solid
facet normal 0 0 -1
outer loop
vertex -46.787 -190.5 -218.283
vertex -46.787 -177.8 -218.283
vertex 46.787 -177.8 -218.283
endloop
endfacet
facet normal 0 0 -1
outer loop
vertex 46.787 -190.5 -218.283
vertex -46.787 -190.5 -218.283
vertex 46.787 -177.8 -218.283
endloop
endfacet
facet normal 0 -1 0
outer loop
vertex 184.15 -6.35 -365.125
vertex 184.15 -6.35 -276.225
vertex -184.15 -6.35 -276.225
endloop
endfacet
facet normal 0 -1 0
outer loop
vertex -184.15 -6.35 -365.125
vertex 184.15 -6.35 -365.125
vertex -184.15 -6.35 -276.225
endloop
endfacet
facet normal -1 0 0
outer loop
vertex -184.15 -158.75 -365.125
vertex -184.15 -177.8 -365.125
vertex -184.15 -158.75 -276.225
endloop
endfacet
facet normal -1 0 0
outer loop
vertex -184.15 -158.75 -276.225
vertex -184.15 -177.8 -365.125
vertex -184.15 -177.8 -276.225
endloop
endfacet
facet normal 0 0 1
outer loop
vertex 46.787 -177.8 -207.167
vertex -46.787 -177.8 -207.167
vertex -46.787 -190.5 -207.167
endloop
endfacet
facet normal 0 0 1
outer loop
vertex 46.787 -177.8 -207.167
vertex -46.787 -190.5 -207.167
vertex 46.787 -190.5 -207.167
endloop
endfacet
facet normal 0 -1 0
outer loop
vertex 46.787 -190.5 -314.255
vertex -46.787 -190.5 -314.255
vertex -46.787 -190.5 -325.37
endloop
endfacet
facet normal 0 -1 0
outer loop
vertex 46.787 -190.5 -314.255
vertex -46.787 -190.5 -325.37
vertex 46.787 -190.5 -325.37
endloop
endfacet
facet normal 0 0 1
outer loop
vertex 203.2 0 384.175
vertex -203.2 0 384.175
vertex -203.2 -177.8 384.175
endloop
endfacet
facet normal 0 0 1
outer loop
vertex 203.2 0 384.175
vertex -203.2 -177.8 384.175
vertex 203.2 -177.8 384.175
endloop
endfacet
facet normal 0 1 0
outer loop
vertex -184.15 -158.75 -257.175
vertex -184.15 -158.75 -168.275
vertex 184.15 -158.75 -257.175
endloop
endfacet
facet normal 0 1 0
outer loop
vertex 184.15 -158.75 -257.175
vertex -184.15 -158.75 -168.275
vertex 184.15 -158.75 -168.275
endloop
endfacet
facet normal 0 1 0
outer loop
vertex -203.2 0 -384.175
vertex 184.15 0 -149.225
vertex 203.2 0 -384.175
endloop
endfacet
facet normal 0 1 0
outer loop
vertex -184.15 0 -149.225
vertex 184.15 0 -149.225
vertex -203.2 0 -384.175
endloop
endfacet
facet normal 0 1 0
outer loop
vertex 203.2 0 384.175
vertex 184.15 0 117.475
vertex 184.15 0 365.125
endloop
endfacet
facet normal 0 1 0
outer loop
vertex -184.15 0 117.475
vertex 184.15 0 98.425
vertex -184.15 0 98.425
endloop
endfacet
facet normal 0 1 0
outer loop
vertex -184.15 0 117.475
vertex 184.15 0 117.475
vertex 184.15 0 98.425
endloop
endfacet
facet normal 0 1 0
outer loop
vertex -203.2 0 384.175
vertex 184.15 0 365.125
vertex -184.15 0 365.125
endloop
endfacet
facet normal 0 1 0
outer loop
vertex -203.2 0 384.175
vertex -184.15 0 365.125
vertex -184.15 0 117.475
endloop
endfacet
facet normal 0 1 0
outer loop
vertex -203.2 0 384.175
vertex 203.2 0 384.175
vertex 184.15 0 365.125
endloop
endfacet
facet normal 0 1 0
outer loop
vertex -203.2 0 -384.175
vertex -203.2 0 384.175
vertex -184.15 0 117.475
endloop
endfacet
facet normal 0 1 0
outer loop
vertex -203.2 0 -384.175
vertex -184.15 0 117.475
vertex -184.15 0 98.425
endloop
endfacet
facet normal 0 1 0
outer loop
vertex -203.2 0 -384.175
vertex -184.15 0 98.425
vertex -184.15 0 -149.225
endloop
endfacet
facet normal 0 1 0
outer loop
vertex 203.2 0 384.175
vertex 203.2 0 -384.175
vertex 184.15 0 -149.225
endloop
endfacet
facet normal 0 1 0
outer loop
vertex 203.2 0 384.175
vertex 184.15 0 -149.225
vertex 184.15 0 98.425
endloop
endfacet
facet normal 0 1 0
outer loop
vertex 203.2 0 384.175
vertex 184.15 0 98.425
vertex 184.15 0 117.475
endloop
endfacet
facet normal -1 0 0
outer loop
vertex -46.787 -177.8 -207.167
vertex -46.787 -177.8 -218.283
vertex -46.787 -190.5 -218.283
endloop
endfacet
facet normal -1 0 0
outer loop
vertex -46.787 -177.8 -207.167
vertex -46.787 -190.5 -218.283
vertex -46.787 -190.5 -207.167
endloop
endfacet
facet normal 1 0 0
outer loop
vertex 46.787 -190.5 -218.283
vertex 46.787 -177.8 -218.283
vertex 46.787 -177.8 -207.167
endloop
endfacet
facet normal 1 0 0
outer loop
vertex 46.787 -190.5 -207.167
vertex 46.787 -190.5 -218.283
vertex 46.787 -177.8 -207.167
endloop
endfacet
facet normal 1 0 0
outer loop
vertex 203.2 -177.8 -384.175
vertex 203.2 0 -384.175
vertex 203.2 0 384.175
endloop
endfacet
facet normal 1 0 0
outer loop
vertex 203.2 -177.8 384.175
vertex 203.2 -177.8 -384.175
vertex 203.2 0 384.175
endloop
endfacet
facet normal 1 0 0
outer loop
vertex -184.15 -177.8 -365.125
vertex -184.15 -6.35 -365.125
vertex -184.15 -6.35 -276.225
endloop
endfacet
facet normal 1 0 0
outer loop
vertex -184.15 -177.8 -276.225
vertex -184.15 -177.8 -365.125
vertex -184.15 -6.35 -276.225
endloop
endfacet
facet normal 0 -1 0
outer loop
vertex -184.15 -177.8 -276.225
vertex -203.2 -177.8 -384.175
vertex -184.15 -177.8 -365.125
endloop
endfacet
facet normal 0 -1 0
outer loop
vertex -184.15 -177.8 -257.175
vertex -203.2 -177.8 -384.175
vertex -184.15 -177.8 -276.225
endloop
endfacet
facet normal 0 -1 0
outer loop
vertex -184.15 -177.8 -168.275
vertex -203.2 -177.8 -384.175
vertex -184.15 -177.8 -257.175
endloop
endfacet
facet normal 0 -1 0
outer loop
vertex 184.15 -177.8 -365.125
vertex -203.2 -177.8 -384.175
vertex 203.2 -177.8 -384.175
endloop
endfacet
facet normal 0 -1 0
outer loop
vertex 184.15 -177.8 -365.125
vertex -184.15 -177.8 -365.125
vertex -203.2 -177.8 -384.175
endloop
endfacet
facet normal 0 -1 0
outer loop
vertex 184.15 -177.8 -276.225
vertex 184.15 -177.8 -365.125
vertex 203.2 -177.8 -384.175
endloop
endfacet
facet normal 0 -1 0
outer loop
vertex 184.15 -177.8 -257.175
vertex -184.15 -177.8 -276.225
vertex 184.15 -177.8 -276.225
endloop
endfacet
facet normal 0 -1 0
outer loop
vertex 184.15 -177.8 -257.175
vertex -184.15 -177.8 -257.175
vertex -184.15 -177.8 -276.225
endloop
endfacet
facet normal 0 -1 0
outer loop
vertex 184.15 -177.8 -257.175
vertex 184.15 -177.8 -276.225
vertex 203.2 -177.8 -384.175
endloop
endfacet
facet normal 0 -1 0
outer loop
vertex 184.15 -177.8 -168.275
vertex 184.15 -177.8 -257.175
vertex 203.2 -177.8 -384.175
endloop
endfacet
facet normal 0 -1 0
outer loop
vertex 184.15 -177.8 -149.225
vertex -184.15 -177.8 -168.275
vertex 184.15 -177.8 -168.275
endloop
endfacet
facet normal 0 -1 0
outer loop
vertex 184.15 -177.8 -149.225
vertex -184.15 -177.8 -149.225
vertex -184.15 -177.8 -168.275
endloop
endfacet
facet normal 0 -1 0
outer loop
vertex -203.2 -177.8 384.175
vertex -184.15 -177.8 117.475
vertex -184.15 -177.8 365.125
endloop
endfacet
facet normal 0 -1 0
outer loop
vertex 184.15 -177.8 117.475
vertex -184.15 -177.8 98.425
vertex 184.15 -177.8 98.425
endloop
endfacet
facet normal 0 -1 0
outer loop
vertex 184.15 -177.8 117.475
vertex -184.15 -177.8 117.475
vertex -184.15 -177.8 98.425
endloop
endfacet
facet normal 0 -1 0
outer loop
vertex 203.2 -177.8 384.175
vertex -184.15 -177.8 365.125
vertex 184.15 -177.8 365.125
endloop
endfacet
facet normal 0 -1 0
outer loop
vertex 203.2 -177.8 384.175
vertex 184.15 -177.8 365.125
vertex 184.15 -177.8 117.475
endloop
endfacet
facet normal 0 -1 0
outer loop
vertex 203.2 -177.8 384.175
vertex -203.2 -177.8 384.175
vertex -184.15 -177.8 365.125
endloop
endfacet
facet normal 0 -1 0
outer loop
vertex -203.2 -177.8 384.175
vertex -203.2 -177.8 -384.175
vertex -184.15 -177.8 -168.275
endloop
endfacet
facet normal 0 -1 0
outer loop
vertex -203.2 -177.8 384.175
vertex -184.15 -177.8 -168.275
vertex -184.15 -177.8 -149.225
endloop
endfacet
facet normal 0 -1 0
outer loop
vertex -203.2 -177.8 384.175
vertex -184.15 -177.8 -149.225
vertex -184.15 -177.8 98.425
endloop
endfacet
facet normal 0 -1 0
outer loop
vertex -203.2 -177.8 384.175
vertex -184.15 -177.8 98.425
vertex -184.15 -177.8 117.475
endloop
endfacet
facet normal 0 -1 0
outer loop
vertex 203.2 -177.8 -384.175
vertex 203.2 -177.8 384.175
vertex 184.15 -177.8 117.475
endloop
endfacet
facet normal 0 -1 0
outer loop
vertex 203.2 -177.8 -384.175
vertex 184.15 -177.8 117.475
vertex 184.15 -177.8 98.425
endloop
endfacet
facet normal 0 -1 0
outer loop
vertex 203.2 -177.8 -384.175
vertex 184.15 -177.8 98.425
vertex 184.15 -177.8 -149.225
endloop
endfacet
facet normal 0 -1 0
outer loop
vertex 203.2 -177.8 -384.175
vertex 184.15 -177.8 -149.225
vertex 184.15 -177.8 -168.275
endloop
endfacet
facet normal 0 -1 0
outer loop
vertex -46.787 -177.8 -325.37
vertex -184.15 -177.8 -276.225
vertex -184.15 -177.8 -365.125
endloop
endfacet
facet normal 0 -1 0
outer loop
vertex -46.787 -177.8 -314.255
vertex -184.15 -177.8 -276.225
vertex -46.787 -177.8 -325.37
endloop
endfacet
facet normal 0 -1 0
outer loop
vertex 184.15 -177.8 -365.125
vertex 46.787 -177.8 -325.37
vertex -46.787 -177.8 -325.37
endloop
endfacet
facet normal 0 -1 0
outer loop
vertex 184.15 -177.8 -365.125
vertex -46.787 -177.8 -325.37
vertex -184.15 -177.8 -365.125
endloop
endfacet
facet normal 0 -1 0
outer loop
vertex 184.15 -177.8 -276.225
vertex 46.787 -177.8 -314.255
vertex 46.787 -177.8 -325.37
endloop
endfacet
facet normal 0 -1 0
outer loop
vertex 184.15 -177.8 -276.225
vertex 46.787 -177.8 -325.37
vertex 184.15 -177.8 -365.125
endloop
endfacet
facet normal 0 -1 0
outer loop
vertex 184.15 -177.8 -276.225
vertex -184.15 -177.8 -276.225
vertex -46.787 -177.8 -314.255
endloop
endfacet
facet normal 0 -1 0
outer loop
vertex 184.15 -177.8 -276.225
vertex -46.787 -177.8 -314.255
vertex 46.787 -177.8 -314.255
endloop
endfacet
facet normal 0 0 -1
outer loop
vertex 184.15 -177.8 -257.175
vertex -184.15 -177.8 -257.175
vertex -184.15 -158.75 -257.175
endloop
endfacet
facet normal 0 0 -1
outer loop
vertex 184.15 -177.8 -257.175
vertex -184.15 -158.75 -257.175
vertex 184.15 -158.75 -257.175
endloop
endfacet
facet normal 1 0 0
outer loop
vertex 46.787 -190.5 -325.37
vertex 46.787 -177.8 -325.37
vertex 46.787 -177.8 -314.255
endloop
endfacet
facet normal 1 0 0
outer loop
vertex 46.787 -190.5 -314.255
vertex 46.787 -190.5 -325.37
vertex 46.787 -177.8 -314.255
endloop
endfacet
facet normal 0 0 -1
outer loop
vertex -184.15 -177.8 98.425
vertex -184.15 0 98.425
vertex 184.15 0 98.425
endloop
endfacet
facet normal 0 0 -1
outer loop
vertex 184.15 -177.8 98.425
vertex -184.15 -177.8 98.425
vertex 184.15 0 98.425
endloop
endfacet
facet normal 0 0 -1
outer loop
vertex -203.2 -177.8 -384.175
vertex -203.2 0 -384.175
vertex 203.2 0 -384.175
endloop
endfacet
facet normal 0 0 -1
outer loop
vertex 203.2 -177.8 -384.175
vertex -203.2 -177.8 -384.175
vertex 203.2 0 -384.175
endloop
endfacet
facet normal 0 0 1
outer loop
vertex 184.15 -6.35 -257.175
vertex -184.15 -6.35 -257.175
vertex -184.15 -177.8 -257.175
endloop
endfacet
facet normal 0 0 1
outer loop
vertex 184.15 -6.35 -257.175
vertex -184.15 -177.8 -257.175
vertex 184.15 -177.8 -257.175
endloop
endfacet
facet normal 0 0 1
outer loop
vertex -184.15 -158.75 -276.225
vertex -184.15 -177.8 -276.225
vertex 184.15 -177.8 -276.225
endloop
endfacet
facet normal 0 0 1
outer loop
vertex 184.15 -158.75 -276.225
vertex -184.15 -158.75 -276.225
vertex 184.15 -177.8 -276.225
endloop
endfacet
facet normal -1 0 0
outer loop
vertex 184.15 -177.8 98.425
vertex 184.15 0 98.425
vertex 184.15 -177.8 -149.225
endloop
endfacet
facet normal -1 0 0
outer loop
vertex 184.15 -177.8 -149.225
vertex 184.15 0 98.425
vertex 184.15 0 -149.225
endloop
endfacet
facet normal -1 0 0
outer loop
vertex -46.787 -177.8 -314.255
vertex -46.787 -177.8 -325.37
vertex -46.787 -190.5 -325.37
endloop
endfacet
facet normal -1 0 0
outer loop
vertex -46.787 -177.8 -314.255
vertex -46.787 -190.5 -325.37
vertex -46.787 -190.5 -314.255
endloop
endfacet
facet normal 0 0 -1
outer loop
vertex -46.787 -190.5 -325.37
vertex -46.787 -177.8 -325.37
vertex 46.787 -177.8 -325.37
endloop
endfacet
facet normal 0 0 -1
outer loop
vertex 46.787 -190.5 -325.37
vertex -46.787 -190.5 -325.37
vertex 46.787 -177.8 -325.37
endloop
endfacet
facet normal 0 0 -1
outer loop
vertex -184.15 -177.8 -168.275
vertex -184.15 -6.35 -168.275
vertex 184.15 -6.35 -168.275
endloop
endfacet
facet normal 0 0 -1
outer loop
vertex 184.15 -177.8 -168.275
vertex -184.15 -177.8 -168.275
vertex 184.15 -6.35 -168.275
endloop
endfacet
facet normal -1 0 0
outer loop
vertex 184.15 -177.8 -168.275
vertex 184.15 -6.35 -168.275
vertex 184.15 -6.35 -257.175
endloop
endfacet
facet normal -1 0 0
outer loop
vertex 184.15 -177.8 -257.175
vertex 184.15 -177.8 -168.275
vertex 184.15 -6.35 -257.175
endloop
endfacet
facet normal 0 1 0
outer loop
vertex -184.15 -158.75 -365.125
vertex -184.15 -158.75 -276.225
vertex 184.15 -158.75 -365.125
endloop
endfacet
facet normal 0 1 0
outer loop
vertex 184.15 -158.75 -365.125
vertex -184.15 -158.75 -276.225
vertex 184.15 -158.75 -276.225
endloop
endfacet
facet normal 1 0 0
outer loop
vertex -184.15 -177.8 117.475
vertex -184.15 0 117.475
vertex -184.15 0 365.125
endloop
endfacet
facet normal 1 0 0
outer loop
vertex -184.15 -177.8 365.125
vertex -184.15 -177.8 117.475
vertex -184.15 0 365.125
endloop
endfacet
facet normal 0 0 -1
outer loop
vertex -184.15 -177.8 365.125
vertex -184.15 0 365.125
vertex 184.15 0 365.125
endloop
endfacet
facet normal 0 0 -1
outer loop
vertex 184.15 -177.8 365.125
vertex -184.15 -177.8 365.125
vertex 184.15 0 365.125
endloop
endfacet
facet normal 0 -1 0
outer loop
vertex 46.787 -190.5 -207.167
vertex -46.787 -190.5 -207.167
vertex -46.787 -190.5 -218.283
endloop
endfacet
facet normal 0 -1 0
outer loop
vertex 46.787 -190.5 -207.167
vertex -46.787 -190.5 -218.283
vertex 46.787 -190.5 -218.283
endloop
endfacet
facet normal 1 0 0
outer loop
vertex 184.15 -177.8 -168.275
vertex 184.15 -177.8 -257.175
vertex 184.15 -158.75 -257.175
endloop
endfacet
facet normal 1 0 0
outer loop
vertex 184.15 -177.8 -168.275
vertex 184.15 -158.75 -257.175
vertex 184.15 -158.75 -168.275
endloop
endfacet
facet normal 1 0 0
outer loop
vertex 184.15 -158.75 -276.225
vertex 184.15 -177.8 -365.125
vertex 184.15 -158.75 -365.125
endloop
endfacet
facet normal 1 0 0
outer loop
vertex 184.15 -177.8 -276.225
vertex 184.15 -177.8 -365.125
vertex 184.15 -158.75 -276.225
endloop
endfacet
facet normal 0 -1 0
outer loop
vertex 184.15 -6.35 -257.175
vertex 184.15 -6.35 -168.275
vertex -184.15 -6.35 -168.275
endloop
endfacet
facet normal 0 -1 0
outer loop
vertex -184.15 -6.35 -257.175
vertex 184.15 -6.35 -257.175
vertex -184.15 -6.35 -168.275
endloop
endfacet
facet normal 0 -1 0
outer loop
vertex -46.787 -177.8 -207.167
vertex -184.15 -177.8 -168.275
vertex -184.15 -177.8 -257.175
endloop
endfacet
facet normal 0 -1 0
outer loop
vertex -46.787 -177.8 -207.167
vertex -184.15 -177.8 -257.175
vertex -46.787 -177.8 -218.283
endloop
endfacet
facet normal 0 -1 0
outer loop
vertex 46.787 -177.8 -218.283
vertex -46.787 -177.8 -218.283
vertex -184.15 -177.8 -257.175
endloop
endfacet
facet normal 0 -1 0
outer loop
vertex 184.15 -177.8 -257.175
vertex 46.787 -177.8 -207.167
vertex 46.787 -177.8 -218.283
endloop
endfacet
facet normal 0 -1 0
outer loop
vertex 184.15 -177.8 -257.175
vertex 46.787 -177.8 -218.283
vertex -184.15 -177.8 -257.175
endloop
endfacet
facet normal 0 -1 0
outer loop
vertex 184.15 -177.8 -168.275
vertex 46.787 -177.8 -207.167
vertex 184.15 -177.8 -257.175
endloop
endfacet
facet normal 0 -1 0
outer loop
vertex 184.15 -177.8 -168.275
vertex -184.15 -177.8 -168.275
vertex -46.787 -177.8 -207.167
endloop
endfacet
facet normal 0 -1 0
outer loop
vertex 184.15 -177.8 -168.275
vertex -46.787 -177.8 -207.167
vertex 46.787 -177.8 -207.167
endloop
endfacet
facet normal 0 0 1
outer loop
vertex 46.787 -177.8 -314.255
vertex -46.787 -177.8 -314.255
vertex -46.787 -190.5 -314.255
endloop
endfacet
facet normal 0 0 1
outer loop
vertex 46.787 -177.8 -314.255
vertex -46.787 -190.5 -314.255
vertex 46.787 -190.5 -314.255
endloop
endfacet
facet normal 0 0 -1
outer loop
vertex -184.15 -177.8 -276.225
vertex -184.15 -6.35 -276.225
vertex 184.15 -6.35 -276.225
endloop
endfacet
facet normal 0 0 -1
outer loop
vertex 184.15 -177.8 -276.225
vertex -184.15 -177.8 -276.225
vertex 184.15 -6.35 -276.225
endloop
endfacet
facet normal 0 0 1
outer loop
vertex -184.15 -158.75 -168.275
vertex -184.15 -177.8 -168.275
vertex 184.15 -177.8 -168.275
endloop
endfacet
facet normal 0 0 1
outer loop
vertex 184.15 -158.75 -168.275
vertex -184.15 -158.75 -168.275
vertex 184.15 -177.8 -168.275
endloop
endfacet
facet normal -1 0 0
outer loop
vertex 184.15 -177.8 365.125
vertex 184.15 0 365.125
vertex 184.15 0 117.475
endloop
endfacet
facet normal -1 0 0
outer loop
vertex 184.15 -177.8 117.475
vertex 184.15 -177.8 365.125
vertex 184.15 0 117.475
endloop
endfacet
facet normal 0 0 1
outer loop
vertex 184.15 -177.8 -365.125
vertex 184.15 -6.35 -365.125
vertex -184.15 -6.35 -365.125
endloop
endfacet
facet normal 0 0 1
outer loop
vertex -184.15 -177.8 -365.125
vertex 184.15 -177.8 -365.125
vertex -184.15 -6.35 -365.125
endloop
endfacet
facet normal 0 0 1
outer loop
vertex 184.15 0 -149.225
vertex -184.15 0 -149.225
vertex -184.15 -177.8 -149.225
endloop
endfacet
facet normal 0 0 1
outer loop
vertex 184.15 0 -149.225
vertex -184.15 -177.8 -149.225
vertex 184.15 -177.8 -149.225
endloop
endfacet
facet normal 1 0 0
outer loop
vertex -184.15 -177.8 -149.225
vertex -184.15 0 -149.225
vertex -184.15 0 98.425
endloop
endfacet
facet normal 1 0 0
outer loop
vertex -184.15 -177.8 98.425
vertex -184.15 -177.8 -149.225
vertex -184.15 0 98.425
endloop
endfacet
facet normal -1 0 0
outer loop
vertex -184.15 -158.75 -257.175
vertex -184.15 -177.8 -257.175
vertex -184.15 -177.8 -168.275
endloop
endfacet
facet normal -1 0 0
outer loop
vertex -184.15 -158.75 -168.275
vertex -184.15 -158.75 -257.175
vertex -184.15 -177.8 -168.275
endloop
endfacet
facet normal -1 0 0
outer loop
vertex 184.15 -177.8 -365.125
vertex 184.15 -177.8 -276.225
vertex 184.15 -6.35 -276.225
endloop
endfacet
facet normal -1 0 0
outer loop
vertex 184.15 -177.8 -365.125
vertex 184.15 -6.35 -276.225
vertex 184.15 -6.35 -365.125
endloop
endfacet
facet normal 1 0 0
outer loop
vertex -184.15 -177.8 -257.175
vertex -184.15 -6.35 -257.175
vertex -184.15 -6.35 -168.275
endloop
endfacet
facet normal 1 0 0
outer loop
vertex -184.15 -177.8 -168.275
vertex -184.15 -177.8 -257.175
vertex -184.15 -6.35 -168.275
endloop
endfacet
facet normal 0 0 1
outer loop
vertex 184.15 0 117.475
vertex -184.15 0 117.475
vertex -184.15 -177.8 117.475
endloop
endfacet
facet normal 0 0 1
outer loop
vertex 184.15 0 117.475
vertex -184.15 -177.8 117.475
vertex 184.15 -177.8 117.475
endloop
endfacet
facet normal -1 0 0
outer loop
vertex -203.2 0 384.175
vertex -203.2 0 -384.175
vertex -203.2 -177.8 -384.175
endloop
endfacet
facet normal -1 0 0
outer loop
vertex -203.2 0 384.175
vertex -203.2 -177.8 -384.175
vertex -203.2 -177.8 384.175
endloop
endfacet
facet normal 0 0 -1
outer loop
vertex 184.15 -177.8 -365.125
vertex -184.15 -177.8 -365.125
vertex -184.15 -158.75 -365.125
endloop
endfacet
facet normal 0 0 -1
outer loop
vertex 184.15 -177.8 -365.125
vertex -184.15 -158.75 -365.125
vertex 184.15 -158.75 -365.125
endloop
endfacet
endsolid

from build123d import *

# Parameters (mm, degrees)
F0_W     = 406.4
F0_H     = 768.35
F0_W_2   = 368.3
F0_H_2   = 19.05
F1_DEPTH = 177.8
F2_W     = 368.3
F2_H     = 88.9
F3_DEPTH = 19.05
F4_W     = 93.574822
F4_H     = 11.115434
F4_H_2   = 11.115435
F5_DEPTH = 12.7
F6_W     = 368.3
F6_H     = 196.85
F7_DEPTH = 6.35


with BuildPart() as f1:
    # F0 (on Front) → F1 (new body)
    with BuildSketch(Plane.XZ):
        Rectangle(F0_W, F0_H)
        Polygon((-184.15, 117.475), (-184.15, 365.125), (184.15, 365.125), (184.15, 117.475), (184.15, 98.425), (184.15, -149.225), (184.15, -168.275), (184.15, -257.175), (184.15, -276.225), (184.15, -365.125), (-184.15, -365.125), (-184.15, -276.225), (-184.15, -257.175), (-184.15, -168.275), (-184.15, -149.225), (-184.15, 98.425), align=None, mode=Mode.SUBTRACT)
        with Locations((0, 107.95)):
            Rectangle(F0_W_2, F0_H_2)
        with Locations((0, -158.75)):
            Rectangle(F0_W_2, F0_H_2)
        with Locations((0, -266.7)):
            Rectangle(F0_W_2, F0_H_2)
    extrude(amount=F1_DEPTH)

    # F6 (on face) → F7 (join)
    with BuildSketch(Plane(origin=(0, 0, 0), x_dir=(-1, 0, 0), z_dir=(0, 1, 0))):
        with Locations((0, -266.7)):
            Rectangle(F6_W, F6_H)
    extrude(amount=-F7_DEPTH)


with BuildPart() as f3:
    # F2 (on face) → F3 (new body)
    with BuildSketch(Plane.XZ.offset(177.8)):
        with Locations((0, -212.725)):
            Rectangle(F2_W, F2_H)
        with Locations((0, -320.675)):
            Rectangle(F2_W, F2_H)
    extrude(amount=-F3_DEPTH)

    # F4 (on face) → F5 (join)
    with BuildSketch(Plane.XZ.offset(177.8)):
        with Locations((0, -212.725)):
            Rectangle(F4_W, F4_H)
        with Locations((0, -319.8124)):
            Rectangle(F4_W, F4_H_2)
    extrude(amount=F5_DEPTH)


solid = Compound([f1.part, f3.part])
